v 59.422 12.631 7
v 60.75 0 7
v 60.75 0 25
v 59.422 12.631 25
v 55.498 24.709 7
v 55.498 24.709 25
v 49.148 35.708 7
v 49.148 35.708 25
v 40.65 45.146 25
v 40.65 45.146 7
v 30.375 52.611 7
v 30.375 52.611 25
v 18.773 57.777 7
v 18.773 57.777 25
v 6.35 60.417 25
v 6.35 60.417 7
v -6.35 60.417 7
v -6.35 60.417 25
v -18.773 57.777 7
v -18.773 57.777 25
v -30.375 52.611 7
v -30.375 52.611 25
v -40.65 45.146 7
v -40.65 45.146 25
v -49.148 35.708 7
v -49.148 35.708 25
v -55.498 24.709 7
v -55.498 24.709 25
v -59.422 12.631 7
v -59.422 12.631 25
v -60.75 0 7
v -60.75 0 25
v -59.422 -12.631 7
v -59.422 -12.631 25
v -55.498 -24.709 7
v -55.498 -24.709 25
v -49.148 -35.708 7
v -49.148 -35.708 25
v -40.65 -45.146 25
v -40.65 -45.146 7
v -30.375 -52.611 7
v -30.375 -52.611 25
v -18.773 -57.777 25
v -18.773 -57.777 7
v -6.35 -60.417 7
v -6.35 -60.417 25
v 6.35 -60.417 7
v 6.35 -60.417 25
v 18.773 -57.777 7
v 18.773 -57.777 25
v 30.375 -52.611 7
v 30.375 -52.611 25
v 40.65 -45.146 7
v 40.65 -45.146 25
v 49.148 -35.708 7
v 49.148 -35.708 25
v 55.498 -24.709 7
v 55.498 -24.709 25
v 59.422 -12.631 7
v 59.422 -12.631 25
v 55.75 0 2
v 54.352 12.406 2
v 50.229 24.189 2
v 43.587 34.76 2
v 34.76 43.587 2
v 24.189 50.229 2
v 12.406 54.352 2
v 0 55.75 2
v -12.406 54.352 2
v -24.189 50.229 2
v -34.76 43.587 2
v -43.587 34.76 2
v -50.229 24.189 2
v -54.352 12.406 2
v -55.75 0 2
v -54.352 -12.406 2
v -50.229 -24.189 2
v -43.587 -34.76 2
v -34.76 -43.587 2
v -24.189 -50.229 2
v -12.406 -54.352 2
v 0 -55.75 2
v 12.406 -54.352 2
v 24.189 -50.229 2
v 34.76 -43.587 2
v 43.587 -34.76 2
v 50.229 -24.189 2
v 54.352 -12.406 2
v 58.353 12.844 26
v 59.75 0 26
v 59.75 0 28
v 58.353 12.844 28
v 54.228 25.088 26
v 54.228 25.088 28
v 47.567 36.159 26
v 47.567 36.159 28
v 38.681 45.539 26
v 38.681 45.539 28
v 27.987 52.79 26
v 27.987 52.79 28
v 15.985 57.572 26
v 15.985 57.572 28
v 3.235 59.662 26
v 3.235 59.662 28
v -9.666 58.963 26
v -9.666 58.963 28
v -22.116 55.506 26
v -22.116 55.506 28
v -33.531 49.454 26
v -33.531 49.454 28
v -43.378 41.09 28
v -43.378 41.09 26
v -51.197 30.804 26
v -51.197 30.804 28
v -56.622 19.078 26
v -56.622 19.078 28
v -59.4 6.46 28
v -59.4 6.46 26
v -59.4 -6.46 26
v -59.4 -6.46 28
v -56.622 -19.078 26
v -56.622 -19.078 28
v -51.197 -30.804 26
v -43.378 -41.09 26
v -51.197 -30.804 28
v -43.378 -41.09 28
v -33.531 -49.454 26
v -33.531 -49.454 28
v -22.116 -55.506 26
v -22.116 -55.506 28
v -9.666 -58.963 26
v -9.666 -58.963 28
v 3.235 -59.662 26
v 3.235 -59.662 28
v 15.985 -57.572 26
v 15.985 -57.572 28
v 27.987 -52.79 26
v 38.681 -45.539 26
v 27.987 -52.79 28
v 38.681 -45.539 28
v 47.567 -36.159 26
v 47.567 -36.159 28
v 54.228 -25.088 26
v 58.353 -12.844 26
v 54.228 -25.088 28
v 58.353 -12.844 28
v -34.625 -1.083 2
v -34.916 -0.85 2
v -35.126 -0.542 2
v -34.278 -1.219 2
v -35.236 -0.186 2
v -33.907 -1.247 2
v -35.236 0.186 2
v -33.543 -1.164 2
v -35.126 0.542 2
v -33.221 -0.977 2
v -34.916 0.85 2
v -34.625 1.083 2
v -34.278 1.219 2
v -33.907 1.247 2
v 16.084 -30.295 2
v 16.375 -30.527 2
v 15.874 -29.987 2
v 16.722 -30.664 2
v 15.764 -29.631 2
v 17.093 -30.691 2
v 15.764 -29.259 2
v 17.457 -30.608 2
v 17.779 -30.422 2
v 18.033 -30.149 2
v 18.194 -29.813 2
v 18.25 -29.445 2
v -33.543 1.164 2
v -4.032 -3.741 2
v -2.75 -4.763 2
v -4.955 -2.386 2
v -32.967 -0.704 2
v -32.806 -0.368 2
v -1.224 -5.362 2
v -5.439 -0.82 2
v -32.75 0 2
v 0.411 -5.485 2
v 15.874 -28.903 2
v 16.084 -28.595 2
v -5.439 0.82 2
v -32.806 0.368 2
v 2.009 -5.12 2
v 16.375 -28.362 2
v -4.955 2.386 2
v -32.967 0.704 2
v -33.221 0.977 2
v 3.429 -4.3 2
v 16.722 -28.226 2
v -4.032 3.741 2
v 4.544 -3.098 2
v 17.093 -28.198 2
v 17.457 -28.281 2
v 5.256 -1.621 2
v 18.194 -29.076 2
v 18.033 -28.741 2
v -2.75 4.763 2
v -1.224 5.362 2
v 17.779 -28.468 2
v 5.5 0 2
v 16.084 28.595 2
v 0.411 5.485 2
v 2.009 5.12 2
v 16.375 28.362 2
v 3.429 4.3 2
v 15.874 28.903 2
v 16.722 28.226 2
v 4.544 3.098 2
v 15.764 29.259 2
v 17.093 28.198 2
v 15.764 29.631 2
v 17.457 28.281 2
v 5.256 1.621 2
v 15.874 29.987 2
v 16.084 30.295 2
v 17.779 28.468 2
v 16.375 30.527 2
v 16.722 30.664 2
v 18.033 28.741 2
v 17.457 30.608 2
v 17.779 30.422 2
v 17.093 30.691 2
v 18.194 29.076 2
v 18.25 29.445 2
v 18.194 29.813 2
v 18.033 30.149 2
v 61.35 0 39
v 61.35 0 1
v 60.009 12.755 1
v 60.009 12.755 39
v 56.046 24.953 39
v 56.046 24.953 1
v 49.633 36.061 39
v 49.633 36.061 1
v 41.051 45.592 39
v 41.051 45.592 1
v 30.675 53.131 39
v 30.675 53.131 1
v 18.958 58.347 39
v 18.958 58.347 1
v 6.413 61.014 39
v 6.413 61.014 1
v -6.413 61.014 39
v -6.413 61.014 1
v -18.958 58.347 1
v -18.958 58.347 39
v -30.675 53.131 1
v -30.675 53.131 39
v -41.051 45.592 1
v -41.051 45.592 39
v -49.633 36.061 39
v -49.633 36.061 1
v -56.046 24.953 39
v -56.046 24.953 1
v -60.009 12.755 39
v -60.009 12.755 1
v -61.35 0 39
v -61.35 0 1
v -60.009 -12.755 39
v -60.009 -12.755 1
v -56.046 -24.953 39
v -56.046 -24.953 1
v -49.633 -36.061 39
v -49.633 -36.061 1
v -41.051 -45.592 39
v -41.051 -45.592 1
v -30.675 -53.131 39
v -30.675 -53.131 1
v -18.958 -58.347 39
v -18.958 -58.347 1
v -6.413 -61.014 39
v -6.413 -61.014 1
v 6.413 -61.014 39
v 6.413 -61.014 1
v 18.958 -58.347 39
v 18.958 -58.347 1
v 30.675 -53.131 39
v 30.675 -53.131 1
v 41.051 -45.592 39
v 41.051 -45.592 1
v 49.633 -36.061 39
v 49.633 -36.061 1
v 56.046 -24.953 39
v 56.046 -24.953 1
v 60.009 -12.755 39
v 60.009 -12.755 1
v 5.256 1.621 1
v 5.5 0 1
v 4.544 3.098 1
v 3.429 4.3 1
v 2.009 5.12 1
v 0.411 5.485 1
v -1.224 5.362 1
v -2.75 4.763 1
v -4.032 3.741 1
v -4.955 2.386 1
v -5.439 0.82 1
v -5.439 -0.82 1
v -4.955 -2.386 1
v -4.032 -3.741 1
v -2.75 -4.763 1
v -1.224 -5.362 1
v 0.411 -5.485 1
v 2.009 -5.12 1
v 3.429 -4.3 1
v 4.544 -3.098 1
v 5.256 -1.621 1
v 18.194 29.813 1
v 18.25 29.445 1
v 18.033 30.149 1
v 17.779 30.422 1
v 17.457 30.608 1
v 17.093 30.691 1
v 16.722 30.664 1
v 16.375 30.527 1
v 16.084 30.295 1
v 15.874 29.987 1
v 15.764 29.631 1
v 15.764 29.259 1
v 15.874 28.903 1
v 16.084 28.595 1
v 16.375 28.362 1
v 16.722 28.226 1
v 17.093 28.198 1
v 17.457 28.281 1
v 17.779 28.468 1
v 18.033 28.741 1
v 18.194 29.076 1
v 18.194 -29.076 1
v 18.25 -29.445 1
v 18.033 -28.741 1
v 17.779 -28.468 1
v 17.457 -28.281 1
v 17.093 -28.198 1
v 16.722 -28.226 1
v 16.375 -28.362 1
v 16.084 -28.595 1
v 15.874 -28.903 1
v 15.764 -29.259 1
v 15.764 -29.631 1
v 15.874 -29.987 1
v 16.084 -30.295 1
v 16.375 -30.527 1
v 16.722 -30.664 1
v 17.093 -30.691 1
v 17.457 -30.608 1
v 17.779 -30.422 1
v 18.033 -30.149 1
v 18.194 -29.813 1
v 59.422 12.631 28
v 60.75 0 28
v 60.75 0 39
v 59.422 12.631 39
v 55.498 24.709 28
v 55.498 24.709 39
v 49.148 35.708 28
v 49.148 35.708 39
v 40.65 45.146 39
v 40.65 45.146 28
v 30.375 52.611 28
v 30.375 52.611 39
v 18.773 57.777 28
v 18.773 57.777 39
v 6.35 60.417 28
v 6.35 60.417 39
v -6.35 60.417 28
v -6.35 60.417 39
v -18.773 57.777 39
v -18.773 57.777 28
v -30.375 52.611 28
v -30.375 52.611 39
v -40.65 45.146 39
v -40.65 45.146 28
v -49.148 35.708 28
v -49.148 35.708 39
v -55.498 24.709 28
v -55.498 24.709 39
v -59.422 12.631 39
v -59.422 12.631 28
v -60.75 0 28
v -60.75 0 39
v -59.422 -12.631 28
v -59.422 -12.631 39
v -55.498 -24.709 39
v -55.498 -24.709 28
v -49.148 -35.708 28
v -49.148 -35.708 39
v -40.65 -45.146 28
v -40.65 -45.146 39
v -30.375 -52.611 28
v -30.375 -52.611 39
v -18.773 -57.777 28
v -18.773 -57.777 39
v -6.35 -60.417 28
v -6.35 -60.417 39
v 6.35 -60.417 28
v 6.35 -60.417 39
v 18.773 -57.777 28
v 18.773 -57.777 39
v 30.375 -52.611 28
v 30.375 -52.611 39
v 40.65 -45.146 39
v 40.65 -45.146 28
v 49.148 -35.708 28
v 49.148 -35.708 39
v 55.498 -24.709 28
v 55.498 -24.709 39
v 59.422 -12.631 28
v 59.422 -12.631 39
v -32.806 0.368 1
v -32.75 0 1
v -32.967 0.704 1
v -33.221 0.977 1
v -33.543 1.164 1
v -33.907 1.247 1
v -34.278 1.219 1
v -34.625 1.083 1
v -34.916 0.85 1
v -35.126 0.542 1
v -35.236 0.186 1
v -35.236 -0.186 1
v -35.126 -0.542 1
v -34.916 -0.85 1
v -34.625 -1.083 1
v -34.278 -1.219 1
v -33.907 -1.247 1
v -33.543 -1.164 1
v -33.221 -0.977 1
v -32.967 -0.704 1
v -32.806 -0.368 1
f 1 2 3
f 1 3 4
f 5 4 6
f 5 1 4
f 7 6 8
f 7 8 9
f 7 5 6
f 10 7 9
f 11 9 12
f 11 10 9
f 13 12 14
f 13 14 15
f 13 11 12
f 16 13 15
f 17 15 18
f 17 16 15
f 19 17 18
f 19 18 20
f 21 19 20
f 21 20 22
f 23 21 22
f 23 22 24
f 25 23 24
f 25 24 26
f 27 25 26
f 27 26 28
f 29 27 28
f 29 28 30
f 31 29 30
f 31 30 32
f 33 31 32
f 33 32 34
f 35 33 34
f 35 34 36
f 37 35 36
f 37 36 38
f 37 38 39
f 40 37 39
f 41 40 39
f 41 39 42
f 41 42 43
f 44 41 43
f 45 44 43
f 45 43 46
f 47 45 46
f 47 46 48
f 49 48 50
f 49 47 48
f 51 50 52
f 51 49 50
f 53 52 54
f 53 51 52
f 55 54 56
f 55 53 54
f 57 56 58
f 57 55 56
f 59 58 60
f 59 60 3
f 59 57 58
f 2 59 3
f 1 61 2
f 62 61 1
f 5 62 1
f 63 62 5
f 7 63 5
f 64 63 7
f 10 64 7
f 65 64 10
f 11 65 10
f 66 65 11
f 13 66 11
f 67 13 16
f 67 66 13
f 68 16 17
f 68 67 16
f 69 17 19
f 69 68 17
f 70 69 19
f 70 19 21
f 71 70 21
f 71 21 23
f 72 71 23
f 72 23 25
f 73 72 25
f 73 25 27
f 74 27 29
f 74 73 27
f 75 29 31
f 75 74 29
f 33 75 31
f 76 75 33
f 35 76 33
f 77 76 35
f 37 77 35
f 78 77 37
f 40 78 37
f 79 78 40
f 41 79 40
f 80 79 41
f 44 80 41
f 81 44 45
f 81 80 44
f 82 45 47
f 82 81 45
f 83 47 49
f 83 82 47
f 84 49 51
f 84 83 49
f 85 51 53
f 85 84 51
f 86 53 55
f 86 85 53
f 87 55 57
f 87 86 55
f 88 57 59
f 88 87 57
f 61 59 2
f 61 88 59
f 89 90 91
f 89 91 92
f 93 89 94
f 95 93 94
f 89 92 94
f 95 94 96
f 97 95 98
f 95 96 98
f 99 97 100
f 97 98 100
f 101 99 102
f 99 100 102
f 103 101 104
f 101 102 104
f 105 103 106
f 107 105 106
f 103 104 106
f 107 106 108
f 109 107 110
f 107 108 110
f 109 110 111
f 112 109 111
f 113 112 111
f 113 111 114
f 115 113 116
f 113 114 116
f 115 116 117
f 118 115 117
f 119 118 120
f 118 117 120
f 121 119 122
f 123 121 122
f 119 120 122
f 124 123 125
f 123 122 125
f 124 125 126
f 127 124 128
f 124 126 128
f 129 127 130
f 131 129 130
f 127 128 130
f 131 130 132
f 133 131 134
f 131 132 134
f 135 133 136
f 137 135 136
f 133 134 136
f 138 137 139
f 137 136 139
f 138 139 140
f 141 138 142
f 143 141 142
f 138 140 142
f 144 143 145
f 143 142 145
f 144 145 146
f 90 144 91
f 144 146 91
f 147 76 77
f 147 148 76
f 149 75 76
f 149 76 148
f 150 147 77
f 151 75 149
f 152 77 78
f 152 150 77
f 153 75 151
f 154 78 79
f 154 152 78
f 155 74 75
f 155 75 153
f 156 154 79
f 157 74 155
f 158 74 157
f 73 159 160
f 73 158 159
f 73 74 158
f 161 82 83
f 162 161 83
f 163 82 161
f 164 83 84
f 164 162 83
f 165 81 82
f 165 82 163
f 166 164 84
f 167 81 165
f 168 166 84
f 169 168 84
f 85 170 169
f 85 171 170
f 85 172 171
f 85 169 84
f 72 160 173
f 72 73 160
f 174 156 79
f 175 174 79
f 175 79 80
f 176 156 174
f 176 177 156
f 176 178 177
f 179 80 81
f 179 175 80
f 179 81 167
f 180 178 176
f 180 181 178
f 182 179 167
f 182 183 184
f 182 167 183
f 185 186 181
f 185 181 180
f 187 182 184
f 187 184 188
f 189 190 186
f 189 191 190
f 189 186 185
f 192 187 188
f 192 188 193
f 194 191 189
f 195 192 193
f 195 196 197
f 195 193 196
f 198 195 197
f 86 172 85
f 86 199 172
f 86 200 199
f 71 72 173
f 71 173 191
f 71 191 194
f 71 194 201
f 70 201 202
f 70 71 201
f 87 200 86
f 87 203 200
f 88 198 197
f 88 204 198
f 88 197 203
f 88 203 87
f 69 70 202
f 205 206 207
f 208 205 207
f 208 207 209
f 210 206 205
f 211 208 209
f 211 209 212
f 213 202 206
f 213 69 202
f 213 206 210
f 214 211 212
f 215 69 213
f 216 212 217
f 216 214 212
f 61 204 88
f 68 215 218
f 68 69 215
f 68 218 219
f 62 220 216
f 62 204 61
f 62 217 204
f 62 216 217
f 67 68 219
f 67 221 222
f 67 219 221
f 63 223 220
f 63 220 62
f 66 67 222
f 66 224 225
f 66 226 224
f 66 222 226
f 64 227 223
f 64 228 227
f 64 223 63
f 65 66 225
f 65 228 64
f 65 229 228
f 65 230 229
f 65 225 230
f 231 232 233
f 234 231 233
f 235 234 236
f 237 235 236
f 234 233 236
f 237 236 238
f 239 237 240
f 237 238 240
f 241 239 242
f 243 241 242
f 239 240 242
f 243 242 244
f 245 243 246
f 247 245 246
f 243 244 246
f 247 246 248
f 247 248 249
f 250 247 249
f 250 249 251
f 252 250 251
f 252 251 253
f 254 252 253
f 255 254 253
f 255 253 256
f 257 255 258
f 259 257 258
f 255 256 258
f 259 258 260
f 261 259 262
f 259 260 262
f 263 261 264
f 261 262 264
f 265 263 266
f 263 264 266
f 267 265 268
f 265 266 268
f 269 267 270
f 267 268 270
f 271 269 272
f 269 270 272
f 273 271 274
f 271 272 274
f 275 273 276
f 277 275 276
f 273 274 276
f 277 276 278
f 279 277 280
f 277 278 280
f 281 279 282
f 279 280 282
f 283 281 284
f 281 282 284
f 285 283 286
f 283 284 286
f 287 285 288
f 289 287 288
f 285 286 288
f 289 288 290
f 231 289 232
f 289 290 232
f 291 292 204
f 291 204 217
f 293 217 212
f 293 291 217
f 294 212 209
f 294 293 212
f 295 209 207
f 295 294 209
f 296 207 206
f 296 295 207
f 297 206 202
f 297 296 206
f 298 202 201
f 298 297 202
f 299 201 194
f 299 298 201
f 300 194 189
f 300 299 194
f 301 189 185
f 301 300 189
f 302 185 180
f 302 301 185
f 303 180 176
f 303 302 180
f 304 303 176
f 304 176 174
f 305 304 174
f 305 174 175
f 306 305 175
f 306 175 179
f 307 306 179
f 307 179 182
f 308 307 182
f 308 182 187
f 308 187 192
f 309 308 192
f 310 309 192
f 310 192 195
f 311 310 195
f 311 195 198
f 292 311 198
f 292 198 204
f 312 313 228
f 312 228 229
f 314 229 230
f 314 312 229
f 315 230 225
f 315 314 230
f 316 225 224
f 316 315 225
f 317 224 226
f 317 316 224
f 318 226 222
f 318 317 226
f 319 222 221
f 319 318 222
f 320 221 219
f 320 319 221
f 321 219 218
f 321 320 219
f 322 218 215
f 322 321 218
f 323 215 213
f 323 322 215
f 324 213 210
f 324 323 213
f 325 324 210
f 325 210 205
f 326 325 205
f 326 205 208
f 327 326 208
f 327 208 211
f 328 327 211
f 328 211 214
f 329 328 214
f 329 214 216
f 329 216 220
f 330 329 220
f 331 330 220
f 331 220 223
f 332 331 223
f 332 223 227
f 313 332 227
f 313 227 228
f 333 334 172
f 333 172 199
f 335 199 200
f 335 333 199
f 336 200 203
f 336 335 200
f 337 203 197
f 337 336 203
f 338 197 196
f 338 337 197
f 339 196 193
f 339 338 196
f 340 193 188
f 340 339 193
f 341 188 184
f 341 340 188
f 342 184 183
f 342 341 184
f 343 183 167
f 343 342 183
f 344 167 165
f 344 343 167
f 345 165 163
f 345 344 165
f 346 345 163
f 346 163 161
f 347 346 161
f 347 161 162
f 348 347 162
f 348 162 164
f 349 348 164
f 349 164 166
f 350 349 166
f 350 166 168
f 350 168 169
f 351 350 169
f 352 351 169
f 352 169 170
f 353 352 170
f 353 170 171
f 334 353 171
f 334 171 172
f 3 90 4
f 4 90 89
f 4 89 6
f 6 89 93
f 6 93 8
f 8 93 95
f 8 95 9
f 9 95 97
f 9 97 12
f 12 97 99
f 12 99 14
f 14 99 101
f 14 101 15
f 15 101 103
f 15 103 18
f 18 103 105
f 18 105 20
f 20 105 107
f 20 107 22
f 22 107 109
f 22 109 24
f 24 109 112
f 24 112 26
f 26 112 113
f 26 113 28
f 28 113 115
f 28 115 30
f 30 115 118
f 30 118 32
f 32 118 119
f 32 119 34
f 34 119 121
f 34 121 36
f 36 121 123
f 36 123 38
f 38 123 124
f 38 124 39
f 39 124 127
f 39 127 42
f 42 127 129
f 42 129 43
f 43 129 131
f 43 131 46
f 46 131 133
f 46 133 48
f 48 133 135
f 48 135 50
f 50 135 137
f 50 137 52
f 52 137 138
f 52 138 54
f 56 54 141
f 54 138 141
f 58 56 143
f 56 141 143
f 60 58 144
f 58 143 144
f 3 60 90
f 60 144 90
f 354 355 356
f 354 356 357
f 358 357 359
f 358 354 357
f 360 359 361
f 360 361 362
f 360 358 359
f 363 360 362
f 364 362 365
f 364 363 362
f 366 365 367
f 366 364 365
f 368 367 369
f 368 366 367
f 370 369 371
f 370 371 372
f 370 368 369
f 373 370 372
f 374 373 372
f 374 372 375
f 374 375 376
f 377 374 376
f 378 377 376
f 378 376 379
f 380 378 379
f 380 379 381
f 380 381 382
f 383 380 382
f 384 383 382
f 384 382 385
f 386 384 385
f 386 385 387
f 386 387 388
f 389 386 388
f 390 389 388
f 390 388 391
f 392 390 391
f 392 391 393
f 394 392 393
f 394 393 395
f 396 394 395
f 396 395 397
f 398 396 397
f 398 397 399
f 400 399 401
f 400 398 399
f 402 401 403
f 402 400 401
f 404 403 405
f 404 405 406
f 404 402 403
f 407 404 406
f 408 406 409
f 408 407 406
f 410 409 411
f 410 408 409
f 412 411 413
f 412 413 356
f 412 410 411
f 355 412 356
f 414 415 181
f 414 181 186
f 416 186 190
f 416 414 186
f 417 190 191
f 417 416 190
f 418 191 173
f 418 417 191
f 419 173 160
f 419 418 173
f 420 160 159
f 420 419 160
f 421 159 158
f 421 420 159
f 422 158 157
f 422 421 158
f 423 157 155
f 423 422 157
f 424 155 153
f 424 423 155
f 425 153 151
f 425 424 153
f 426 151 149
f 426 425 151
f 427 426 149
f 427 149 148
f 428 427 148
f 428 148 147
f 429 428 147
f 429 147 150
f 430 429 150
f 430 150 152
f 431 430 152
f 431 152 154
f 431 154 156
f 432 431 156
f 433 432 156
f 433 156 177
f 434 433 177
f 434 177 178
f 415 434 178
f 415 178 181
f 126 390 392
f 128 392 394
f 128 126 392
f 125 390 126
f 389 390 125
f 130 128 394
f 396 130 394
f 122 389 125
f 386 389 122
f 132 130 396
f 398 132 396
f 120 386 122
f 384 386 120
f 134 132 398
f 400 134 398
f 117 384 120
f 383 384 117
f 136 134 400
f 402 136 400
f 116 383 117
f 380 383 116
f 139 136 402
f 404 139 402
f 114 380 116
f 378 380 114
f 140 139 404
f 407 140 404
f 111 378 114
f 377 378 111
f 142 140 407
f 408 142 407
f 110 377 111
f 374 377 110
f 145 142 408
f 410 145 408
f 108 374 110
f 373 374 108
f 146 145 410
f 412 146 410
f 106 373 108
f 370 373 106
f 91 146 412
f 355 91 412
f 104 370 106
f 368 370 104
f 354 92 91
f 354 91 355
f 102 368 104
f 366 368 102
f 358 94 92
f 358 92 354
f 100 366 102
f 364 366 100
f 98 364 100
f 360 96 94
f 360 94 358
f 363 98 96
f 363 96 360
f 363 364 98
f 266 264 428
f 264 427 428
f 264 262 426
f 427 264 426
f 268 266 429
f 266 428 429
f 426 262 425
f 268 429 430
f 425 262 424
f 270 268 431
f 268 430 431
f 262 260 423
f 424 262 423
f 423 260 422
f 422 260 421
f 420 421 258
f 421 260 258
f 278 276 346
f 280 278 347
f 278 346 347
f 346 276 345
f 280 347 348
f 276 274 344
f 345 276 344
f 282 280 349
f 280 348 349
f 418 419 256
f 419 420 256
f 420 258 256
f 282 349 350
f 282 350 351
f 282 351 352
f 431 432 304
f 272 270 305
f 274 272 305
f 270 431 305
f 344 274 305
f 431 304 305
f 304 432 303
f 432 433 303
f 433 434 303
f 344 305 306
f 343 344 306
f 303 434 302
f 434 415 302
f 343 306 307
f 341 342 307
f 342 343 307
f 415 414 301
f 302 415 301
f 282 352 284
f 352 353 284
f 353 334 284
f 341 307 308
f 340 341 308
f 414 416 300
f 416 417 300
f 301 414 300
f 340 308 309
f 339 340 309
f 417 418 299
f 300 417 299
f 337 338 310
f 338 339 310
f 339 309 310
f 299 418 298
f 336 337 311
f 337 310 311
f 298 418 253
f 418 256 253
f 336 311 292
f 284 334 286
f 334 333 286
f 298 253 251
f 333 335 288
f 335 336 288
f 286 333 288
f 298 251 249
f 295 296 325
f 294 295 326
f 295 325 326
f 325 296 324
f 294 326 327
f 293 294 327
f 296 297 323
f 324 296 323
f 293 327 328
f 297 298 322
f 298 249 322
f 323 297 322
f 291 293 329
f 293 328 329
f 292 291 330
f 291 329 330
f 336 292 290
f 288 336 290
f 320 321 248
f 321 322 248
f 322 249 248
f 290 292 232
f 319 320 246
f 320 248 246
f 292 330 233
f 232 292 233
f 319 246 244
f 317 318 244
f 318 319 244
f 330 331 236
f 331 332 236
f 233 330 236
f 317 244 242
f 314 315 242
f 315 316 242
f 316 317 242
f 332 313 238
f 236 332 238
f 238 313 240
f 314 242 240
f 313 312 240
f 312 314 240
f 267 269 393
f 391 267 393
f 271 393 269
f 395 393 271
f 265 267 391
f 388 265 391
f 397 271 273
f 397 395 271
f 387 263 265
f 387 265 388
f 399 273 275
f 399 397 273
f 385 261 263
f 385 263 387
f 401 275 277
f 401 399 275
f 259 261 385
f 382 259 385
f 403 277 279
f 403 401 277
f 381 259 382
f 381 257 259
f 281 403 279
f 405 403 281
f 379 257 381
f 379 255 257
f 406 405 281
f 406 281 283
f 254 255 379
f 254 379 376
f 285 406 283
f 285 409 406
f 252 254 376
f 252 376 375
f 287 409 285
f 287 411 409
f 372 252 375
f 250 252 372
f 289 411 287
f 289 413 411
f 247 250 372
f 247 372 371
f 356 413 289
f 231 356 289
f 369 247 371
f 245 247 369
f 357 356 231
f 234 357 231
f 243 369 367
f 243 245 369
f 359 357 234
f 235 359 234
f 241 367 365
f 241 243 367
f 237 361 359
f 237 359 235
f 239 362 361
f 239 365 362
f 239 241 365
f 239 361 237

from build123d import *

# Parameters (mm, degrees)
F0_R        = 61.35
F0_R_2      = 1.25
F0_R_3      = 5.5
F1_DEPTH    = 2
F2_R        = 61.35
F2_R_2      = 60.75
F3_DEPTH    = 37
F2_R_3      = 59.75
F4_DEPTH    = 26
F5_DEPTH    = 25
F6_S5_R     = 59.75
F6_T6_DEPTH = 87
F7_SIZE     = 5
F8_DEPTH    = 1


# Not quite as in the source:
# - a fillet or chamfer that OpenCascade refuses, or shapes differently, is made with other operations: its cross-section is extruded or revolved along the edge and cut away or added


with BuildPart() as f1:
    # F0 (on Top) → F1 (new body)
    with BuildSketch(Plane.XY):
        Circle(F0_R)
        with Locations((17, -29.4448637287)):
            Circle(F0_R_2, mode=Mode.SUBTRACT)
        with Locations((-34, 0)):
            Circle(F0_R_2, mode=Mode.SUBTRACT)
        Circle(F0_R_3, mode=Mode.SUBTRACT)
        with Locations((17, 29.4448637287)):
            Circle(F0_R_2, mode=Mode.SUBTRACT)
    extrude(amount=F1_DEPTH)

    # F2 (on face) → F3 (join)
    with BuildSketch(Plane.XY.offset(2)):
        Circle(F2_R)
        Circle(F2_R_2, mode=Mode.SUBTRACT)
    extrude(amount=F3_DEPTH)

    # F2 (on face) → F4 (join)
    with BuildSketch(Plane.XY.offset(2)):
        Circle(F2_R_2)
        Circle(F2_R_3, mode=Mode.SUBTRACT)
    extrude(amount=F4_DEPTH)

    # F2 (on face) → F5 (cut)
    with BuildSketch(Plane.XY.offset(2)):
        Circle(F2_R_2)
        Circle(F2_R_3, mode=Mode.SUBTRACT)
    extrude(amount=F5_DEPTH, mode=Mode.SUBTRACT)

    # F6: chamfer of 2 on 1 edges, made by hand


with BuildPart() as f6_tool2:
    # F6_s3 → F6_t4 (revolve)
    with BuildSketch(Plane.XZ):
        Polygon((60.75, 25), (58.75, 27), (60.75, 27), align=None)
    revolve(axis=Axis((0, 0, 27), (0, 0, 1)))

    # F6_s5 → F6_t6 (cut, symmetric)
    with BuildSketch(Plane.XY.offset(26)):
        Circle(F6_S5_R)
    extrude(amount=F6_T6_DEPTH, both=True, mode=Mode.SUBTRACT)


with BuildPart() as f1_1:
    add(f1.part)

    # F6_t1: union F6_tool2
    add(f6_tool2.part)

    # F7
    f7_edges = [f1_1.edges().sort_by_distance(p)[0] for p in [
        (-60.75, 0, 2),
    ]]
    chamfer(f7_edges, length=F7_SIZE)

    # F8 (cut): a face of the model
    f8_faces = [f1_1.faces().sort_by_distance(p)[0] for p in [
        (-59.614759959, 0, 0),
    ]]
    extrude(f8_faces, amount=-F8_DEPTH, mode=Mode.SUBTRACT)


solid = f1_1.part
